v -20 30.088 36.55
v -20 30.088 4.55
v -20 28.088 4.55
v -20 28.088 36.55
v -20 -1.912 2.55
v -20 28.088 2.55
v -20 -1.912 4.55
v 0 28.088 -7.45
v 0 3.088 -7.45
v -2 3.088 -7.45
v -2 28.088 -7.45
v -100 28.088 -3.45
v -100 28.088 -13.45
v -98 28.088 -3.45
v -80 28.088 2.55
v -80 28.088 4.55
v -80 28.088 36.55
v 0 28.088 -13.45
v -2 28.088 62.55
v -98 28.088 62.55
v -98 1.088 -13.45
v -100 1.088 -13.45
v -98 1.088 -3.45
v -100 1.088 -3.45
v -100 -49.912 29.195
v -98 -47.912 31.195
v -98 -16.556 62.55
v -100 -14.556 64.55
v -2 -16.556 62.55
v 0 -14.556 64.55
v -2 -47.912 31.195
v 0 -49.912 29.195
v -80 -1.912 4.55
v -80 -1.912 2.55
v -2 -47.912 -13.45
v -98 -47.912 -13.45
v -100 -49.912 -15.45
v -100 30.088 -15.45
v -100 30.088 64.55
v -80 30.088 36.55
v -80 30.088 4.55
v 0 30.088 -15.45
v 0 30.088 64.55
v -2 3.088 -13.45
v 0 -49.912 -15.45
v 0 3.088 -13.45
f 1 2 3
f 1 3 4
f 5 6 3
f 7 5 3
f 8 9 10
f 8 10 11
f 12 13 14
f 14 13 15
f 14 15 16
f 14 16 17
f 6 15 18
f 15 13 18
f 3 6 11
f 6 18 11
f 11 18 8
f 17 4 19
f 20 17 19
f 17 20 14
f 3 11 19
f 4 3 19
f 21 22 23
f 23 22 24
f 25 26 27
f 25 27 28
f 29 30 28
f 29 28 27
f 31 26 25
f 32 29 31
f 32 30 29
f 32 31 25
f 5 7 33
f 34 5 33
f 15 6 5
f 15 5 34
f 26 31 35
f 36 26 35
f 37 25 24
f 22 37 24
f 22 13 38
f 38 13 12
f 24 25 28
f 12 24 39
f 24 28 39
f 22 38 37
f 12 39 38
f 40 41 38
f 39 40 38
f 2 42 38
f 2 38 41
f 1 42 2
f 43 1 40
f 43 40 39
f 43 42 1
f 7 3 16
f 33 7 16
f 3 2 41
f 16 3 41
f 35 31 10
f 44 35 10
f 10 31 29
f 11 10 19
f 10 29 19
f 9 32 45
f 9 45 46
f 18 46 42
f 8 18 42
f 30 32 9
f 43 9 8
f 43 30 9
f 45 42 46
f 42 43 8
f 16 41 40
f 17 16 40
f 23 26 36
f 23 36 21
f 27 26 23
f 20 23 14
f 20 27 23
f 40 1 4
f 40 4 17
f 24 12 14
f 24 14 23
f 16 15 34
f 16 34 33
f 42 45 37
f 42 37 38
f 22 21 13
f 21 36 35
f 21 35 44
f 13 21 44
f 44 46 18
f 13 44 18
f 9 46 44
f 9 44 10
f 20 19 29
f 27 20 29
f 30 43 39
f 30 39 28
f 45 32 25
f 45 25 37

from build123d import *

# Parameters (mm, degrees)
F0_W     = 25
F0_H     = 6
F1_DEPTH = 100
F2_T     = -2
F3_DEPTH = 2
F4_W     = 27
F4_H     = 10
F5_DEPTH = 2
F6_W     = 60
F6_H     = 32
F7_DEPTH = 2
F6_H_2   = 2
F8_DEPTH = 32


with BuildPart() as f1:
    # F0 (on Right) → F1 (new body)
    with BuildSketch(Plane.YZ):
        Polygon((-49.9118241506, 29.1949231178), (-49.9118241506, -15.4497378229), (30.0881758494, -15.4497378229), (30.0881758494, 64.5502621771), (-14.5564850913, 64.5502621771), align=None)
        with Locations((15.5881758494, -10.4497378229)):
            Rectangle(F0_W, F0_H, mode=Mode.SUBTRACT)
        with Locations((15.5881758494, -10.4497378229)):
            Rectangle(F0_W, F0_H)
    extrude(amount=-F1_DEPTH)

    # F2
    f2_openings = [f1.faces().sort_by_distance(p)[0] for p in [
        (-50, -32.234155, 46.872593),
    ]]
    offset(amount=F2_T, openings=f2_openings)

    # F0 (on Right) → F3 (cut)
    with BuildSketch(Plane.YZ):
        with Locations((15.5881758494, -10.4497378229)):
            Rectangle(F0_W, F0_H)
    extrude(amount=-F3_DEPTH, mode=Mode.SUBTRACT)

    # F4 (on face) → F5 (cut)
    with BuildSketch(Plane(origin=(-100, 0, 0), x_dir=(0, -1, 0), z_dir=(-1, 0, 0))):
        with Locations((-14.5881758494, -8.4497378229)):
            Rectangle(F4_W, F4_H)
    extrude(amount=-F5_DEPTH, mode=Mode.SUBTRACT)

    # F6 (on face) → F7 (cut)
    with BuildSketch(Plane(origin=(0, 30.0881758494, 0), x_dir=(-1, 0, 0), z_dir=(0, 1, 0))):
        with Locations((50, 20.5502621771)):
            Rectangle(F6_W, F6_H)
    extrude(amount=-F7_DEPTH, mode=Mode.SUBTRACT)

    # F6 (on face) → F8 (join)
    with BuildSketch(Plane(origin=(0, 30.0881758494, 0), x_dir=(-1, 0, 0), z_dir=(0, 1, 0))):
        with Locations((50, 3.5502621771)):
            Rectangle(F6_W, F6_H_2)
    extrude(amount=-F8_DEPTH)


solid = f1.part
